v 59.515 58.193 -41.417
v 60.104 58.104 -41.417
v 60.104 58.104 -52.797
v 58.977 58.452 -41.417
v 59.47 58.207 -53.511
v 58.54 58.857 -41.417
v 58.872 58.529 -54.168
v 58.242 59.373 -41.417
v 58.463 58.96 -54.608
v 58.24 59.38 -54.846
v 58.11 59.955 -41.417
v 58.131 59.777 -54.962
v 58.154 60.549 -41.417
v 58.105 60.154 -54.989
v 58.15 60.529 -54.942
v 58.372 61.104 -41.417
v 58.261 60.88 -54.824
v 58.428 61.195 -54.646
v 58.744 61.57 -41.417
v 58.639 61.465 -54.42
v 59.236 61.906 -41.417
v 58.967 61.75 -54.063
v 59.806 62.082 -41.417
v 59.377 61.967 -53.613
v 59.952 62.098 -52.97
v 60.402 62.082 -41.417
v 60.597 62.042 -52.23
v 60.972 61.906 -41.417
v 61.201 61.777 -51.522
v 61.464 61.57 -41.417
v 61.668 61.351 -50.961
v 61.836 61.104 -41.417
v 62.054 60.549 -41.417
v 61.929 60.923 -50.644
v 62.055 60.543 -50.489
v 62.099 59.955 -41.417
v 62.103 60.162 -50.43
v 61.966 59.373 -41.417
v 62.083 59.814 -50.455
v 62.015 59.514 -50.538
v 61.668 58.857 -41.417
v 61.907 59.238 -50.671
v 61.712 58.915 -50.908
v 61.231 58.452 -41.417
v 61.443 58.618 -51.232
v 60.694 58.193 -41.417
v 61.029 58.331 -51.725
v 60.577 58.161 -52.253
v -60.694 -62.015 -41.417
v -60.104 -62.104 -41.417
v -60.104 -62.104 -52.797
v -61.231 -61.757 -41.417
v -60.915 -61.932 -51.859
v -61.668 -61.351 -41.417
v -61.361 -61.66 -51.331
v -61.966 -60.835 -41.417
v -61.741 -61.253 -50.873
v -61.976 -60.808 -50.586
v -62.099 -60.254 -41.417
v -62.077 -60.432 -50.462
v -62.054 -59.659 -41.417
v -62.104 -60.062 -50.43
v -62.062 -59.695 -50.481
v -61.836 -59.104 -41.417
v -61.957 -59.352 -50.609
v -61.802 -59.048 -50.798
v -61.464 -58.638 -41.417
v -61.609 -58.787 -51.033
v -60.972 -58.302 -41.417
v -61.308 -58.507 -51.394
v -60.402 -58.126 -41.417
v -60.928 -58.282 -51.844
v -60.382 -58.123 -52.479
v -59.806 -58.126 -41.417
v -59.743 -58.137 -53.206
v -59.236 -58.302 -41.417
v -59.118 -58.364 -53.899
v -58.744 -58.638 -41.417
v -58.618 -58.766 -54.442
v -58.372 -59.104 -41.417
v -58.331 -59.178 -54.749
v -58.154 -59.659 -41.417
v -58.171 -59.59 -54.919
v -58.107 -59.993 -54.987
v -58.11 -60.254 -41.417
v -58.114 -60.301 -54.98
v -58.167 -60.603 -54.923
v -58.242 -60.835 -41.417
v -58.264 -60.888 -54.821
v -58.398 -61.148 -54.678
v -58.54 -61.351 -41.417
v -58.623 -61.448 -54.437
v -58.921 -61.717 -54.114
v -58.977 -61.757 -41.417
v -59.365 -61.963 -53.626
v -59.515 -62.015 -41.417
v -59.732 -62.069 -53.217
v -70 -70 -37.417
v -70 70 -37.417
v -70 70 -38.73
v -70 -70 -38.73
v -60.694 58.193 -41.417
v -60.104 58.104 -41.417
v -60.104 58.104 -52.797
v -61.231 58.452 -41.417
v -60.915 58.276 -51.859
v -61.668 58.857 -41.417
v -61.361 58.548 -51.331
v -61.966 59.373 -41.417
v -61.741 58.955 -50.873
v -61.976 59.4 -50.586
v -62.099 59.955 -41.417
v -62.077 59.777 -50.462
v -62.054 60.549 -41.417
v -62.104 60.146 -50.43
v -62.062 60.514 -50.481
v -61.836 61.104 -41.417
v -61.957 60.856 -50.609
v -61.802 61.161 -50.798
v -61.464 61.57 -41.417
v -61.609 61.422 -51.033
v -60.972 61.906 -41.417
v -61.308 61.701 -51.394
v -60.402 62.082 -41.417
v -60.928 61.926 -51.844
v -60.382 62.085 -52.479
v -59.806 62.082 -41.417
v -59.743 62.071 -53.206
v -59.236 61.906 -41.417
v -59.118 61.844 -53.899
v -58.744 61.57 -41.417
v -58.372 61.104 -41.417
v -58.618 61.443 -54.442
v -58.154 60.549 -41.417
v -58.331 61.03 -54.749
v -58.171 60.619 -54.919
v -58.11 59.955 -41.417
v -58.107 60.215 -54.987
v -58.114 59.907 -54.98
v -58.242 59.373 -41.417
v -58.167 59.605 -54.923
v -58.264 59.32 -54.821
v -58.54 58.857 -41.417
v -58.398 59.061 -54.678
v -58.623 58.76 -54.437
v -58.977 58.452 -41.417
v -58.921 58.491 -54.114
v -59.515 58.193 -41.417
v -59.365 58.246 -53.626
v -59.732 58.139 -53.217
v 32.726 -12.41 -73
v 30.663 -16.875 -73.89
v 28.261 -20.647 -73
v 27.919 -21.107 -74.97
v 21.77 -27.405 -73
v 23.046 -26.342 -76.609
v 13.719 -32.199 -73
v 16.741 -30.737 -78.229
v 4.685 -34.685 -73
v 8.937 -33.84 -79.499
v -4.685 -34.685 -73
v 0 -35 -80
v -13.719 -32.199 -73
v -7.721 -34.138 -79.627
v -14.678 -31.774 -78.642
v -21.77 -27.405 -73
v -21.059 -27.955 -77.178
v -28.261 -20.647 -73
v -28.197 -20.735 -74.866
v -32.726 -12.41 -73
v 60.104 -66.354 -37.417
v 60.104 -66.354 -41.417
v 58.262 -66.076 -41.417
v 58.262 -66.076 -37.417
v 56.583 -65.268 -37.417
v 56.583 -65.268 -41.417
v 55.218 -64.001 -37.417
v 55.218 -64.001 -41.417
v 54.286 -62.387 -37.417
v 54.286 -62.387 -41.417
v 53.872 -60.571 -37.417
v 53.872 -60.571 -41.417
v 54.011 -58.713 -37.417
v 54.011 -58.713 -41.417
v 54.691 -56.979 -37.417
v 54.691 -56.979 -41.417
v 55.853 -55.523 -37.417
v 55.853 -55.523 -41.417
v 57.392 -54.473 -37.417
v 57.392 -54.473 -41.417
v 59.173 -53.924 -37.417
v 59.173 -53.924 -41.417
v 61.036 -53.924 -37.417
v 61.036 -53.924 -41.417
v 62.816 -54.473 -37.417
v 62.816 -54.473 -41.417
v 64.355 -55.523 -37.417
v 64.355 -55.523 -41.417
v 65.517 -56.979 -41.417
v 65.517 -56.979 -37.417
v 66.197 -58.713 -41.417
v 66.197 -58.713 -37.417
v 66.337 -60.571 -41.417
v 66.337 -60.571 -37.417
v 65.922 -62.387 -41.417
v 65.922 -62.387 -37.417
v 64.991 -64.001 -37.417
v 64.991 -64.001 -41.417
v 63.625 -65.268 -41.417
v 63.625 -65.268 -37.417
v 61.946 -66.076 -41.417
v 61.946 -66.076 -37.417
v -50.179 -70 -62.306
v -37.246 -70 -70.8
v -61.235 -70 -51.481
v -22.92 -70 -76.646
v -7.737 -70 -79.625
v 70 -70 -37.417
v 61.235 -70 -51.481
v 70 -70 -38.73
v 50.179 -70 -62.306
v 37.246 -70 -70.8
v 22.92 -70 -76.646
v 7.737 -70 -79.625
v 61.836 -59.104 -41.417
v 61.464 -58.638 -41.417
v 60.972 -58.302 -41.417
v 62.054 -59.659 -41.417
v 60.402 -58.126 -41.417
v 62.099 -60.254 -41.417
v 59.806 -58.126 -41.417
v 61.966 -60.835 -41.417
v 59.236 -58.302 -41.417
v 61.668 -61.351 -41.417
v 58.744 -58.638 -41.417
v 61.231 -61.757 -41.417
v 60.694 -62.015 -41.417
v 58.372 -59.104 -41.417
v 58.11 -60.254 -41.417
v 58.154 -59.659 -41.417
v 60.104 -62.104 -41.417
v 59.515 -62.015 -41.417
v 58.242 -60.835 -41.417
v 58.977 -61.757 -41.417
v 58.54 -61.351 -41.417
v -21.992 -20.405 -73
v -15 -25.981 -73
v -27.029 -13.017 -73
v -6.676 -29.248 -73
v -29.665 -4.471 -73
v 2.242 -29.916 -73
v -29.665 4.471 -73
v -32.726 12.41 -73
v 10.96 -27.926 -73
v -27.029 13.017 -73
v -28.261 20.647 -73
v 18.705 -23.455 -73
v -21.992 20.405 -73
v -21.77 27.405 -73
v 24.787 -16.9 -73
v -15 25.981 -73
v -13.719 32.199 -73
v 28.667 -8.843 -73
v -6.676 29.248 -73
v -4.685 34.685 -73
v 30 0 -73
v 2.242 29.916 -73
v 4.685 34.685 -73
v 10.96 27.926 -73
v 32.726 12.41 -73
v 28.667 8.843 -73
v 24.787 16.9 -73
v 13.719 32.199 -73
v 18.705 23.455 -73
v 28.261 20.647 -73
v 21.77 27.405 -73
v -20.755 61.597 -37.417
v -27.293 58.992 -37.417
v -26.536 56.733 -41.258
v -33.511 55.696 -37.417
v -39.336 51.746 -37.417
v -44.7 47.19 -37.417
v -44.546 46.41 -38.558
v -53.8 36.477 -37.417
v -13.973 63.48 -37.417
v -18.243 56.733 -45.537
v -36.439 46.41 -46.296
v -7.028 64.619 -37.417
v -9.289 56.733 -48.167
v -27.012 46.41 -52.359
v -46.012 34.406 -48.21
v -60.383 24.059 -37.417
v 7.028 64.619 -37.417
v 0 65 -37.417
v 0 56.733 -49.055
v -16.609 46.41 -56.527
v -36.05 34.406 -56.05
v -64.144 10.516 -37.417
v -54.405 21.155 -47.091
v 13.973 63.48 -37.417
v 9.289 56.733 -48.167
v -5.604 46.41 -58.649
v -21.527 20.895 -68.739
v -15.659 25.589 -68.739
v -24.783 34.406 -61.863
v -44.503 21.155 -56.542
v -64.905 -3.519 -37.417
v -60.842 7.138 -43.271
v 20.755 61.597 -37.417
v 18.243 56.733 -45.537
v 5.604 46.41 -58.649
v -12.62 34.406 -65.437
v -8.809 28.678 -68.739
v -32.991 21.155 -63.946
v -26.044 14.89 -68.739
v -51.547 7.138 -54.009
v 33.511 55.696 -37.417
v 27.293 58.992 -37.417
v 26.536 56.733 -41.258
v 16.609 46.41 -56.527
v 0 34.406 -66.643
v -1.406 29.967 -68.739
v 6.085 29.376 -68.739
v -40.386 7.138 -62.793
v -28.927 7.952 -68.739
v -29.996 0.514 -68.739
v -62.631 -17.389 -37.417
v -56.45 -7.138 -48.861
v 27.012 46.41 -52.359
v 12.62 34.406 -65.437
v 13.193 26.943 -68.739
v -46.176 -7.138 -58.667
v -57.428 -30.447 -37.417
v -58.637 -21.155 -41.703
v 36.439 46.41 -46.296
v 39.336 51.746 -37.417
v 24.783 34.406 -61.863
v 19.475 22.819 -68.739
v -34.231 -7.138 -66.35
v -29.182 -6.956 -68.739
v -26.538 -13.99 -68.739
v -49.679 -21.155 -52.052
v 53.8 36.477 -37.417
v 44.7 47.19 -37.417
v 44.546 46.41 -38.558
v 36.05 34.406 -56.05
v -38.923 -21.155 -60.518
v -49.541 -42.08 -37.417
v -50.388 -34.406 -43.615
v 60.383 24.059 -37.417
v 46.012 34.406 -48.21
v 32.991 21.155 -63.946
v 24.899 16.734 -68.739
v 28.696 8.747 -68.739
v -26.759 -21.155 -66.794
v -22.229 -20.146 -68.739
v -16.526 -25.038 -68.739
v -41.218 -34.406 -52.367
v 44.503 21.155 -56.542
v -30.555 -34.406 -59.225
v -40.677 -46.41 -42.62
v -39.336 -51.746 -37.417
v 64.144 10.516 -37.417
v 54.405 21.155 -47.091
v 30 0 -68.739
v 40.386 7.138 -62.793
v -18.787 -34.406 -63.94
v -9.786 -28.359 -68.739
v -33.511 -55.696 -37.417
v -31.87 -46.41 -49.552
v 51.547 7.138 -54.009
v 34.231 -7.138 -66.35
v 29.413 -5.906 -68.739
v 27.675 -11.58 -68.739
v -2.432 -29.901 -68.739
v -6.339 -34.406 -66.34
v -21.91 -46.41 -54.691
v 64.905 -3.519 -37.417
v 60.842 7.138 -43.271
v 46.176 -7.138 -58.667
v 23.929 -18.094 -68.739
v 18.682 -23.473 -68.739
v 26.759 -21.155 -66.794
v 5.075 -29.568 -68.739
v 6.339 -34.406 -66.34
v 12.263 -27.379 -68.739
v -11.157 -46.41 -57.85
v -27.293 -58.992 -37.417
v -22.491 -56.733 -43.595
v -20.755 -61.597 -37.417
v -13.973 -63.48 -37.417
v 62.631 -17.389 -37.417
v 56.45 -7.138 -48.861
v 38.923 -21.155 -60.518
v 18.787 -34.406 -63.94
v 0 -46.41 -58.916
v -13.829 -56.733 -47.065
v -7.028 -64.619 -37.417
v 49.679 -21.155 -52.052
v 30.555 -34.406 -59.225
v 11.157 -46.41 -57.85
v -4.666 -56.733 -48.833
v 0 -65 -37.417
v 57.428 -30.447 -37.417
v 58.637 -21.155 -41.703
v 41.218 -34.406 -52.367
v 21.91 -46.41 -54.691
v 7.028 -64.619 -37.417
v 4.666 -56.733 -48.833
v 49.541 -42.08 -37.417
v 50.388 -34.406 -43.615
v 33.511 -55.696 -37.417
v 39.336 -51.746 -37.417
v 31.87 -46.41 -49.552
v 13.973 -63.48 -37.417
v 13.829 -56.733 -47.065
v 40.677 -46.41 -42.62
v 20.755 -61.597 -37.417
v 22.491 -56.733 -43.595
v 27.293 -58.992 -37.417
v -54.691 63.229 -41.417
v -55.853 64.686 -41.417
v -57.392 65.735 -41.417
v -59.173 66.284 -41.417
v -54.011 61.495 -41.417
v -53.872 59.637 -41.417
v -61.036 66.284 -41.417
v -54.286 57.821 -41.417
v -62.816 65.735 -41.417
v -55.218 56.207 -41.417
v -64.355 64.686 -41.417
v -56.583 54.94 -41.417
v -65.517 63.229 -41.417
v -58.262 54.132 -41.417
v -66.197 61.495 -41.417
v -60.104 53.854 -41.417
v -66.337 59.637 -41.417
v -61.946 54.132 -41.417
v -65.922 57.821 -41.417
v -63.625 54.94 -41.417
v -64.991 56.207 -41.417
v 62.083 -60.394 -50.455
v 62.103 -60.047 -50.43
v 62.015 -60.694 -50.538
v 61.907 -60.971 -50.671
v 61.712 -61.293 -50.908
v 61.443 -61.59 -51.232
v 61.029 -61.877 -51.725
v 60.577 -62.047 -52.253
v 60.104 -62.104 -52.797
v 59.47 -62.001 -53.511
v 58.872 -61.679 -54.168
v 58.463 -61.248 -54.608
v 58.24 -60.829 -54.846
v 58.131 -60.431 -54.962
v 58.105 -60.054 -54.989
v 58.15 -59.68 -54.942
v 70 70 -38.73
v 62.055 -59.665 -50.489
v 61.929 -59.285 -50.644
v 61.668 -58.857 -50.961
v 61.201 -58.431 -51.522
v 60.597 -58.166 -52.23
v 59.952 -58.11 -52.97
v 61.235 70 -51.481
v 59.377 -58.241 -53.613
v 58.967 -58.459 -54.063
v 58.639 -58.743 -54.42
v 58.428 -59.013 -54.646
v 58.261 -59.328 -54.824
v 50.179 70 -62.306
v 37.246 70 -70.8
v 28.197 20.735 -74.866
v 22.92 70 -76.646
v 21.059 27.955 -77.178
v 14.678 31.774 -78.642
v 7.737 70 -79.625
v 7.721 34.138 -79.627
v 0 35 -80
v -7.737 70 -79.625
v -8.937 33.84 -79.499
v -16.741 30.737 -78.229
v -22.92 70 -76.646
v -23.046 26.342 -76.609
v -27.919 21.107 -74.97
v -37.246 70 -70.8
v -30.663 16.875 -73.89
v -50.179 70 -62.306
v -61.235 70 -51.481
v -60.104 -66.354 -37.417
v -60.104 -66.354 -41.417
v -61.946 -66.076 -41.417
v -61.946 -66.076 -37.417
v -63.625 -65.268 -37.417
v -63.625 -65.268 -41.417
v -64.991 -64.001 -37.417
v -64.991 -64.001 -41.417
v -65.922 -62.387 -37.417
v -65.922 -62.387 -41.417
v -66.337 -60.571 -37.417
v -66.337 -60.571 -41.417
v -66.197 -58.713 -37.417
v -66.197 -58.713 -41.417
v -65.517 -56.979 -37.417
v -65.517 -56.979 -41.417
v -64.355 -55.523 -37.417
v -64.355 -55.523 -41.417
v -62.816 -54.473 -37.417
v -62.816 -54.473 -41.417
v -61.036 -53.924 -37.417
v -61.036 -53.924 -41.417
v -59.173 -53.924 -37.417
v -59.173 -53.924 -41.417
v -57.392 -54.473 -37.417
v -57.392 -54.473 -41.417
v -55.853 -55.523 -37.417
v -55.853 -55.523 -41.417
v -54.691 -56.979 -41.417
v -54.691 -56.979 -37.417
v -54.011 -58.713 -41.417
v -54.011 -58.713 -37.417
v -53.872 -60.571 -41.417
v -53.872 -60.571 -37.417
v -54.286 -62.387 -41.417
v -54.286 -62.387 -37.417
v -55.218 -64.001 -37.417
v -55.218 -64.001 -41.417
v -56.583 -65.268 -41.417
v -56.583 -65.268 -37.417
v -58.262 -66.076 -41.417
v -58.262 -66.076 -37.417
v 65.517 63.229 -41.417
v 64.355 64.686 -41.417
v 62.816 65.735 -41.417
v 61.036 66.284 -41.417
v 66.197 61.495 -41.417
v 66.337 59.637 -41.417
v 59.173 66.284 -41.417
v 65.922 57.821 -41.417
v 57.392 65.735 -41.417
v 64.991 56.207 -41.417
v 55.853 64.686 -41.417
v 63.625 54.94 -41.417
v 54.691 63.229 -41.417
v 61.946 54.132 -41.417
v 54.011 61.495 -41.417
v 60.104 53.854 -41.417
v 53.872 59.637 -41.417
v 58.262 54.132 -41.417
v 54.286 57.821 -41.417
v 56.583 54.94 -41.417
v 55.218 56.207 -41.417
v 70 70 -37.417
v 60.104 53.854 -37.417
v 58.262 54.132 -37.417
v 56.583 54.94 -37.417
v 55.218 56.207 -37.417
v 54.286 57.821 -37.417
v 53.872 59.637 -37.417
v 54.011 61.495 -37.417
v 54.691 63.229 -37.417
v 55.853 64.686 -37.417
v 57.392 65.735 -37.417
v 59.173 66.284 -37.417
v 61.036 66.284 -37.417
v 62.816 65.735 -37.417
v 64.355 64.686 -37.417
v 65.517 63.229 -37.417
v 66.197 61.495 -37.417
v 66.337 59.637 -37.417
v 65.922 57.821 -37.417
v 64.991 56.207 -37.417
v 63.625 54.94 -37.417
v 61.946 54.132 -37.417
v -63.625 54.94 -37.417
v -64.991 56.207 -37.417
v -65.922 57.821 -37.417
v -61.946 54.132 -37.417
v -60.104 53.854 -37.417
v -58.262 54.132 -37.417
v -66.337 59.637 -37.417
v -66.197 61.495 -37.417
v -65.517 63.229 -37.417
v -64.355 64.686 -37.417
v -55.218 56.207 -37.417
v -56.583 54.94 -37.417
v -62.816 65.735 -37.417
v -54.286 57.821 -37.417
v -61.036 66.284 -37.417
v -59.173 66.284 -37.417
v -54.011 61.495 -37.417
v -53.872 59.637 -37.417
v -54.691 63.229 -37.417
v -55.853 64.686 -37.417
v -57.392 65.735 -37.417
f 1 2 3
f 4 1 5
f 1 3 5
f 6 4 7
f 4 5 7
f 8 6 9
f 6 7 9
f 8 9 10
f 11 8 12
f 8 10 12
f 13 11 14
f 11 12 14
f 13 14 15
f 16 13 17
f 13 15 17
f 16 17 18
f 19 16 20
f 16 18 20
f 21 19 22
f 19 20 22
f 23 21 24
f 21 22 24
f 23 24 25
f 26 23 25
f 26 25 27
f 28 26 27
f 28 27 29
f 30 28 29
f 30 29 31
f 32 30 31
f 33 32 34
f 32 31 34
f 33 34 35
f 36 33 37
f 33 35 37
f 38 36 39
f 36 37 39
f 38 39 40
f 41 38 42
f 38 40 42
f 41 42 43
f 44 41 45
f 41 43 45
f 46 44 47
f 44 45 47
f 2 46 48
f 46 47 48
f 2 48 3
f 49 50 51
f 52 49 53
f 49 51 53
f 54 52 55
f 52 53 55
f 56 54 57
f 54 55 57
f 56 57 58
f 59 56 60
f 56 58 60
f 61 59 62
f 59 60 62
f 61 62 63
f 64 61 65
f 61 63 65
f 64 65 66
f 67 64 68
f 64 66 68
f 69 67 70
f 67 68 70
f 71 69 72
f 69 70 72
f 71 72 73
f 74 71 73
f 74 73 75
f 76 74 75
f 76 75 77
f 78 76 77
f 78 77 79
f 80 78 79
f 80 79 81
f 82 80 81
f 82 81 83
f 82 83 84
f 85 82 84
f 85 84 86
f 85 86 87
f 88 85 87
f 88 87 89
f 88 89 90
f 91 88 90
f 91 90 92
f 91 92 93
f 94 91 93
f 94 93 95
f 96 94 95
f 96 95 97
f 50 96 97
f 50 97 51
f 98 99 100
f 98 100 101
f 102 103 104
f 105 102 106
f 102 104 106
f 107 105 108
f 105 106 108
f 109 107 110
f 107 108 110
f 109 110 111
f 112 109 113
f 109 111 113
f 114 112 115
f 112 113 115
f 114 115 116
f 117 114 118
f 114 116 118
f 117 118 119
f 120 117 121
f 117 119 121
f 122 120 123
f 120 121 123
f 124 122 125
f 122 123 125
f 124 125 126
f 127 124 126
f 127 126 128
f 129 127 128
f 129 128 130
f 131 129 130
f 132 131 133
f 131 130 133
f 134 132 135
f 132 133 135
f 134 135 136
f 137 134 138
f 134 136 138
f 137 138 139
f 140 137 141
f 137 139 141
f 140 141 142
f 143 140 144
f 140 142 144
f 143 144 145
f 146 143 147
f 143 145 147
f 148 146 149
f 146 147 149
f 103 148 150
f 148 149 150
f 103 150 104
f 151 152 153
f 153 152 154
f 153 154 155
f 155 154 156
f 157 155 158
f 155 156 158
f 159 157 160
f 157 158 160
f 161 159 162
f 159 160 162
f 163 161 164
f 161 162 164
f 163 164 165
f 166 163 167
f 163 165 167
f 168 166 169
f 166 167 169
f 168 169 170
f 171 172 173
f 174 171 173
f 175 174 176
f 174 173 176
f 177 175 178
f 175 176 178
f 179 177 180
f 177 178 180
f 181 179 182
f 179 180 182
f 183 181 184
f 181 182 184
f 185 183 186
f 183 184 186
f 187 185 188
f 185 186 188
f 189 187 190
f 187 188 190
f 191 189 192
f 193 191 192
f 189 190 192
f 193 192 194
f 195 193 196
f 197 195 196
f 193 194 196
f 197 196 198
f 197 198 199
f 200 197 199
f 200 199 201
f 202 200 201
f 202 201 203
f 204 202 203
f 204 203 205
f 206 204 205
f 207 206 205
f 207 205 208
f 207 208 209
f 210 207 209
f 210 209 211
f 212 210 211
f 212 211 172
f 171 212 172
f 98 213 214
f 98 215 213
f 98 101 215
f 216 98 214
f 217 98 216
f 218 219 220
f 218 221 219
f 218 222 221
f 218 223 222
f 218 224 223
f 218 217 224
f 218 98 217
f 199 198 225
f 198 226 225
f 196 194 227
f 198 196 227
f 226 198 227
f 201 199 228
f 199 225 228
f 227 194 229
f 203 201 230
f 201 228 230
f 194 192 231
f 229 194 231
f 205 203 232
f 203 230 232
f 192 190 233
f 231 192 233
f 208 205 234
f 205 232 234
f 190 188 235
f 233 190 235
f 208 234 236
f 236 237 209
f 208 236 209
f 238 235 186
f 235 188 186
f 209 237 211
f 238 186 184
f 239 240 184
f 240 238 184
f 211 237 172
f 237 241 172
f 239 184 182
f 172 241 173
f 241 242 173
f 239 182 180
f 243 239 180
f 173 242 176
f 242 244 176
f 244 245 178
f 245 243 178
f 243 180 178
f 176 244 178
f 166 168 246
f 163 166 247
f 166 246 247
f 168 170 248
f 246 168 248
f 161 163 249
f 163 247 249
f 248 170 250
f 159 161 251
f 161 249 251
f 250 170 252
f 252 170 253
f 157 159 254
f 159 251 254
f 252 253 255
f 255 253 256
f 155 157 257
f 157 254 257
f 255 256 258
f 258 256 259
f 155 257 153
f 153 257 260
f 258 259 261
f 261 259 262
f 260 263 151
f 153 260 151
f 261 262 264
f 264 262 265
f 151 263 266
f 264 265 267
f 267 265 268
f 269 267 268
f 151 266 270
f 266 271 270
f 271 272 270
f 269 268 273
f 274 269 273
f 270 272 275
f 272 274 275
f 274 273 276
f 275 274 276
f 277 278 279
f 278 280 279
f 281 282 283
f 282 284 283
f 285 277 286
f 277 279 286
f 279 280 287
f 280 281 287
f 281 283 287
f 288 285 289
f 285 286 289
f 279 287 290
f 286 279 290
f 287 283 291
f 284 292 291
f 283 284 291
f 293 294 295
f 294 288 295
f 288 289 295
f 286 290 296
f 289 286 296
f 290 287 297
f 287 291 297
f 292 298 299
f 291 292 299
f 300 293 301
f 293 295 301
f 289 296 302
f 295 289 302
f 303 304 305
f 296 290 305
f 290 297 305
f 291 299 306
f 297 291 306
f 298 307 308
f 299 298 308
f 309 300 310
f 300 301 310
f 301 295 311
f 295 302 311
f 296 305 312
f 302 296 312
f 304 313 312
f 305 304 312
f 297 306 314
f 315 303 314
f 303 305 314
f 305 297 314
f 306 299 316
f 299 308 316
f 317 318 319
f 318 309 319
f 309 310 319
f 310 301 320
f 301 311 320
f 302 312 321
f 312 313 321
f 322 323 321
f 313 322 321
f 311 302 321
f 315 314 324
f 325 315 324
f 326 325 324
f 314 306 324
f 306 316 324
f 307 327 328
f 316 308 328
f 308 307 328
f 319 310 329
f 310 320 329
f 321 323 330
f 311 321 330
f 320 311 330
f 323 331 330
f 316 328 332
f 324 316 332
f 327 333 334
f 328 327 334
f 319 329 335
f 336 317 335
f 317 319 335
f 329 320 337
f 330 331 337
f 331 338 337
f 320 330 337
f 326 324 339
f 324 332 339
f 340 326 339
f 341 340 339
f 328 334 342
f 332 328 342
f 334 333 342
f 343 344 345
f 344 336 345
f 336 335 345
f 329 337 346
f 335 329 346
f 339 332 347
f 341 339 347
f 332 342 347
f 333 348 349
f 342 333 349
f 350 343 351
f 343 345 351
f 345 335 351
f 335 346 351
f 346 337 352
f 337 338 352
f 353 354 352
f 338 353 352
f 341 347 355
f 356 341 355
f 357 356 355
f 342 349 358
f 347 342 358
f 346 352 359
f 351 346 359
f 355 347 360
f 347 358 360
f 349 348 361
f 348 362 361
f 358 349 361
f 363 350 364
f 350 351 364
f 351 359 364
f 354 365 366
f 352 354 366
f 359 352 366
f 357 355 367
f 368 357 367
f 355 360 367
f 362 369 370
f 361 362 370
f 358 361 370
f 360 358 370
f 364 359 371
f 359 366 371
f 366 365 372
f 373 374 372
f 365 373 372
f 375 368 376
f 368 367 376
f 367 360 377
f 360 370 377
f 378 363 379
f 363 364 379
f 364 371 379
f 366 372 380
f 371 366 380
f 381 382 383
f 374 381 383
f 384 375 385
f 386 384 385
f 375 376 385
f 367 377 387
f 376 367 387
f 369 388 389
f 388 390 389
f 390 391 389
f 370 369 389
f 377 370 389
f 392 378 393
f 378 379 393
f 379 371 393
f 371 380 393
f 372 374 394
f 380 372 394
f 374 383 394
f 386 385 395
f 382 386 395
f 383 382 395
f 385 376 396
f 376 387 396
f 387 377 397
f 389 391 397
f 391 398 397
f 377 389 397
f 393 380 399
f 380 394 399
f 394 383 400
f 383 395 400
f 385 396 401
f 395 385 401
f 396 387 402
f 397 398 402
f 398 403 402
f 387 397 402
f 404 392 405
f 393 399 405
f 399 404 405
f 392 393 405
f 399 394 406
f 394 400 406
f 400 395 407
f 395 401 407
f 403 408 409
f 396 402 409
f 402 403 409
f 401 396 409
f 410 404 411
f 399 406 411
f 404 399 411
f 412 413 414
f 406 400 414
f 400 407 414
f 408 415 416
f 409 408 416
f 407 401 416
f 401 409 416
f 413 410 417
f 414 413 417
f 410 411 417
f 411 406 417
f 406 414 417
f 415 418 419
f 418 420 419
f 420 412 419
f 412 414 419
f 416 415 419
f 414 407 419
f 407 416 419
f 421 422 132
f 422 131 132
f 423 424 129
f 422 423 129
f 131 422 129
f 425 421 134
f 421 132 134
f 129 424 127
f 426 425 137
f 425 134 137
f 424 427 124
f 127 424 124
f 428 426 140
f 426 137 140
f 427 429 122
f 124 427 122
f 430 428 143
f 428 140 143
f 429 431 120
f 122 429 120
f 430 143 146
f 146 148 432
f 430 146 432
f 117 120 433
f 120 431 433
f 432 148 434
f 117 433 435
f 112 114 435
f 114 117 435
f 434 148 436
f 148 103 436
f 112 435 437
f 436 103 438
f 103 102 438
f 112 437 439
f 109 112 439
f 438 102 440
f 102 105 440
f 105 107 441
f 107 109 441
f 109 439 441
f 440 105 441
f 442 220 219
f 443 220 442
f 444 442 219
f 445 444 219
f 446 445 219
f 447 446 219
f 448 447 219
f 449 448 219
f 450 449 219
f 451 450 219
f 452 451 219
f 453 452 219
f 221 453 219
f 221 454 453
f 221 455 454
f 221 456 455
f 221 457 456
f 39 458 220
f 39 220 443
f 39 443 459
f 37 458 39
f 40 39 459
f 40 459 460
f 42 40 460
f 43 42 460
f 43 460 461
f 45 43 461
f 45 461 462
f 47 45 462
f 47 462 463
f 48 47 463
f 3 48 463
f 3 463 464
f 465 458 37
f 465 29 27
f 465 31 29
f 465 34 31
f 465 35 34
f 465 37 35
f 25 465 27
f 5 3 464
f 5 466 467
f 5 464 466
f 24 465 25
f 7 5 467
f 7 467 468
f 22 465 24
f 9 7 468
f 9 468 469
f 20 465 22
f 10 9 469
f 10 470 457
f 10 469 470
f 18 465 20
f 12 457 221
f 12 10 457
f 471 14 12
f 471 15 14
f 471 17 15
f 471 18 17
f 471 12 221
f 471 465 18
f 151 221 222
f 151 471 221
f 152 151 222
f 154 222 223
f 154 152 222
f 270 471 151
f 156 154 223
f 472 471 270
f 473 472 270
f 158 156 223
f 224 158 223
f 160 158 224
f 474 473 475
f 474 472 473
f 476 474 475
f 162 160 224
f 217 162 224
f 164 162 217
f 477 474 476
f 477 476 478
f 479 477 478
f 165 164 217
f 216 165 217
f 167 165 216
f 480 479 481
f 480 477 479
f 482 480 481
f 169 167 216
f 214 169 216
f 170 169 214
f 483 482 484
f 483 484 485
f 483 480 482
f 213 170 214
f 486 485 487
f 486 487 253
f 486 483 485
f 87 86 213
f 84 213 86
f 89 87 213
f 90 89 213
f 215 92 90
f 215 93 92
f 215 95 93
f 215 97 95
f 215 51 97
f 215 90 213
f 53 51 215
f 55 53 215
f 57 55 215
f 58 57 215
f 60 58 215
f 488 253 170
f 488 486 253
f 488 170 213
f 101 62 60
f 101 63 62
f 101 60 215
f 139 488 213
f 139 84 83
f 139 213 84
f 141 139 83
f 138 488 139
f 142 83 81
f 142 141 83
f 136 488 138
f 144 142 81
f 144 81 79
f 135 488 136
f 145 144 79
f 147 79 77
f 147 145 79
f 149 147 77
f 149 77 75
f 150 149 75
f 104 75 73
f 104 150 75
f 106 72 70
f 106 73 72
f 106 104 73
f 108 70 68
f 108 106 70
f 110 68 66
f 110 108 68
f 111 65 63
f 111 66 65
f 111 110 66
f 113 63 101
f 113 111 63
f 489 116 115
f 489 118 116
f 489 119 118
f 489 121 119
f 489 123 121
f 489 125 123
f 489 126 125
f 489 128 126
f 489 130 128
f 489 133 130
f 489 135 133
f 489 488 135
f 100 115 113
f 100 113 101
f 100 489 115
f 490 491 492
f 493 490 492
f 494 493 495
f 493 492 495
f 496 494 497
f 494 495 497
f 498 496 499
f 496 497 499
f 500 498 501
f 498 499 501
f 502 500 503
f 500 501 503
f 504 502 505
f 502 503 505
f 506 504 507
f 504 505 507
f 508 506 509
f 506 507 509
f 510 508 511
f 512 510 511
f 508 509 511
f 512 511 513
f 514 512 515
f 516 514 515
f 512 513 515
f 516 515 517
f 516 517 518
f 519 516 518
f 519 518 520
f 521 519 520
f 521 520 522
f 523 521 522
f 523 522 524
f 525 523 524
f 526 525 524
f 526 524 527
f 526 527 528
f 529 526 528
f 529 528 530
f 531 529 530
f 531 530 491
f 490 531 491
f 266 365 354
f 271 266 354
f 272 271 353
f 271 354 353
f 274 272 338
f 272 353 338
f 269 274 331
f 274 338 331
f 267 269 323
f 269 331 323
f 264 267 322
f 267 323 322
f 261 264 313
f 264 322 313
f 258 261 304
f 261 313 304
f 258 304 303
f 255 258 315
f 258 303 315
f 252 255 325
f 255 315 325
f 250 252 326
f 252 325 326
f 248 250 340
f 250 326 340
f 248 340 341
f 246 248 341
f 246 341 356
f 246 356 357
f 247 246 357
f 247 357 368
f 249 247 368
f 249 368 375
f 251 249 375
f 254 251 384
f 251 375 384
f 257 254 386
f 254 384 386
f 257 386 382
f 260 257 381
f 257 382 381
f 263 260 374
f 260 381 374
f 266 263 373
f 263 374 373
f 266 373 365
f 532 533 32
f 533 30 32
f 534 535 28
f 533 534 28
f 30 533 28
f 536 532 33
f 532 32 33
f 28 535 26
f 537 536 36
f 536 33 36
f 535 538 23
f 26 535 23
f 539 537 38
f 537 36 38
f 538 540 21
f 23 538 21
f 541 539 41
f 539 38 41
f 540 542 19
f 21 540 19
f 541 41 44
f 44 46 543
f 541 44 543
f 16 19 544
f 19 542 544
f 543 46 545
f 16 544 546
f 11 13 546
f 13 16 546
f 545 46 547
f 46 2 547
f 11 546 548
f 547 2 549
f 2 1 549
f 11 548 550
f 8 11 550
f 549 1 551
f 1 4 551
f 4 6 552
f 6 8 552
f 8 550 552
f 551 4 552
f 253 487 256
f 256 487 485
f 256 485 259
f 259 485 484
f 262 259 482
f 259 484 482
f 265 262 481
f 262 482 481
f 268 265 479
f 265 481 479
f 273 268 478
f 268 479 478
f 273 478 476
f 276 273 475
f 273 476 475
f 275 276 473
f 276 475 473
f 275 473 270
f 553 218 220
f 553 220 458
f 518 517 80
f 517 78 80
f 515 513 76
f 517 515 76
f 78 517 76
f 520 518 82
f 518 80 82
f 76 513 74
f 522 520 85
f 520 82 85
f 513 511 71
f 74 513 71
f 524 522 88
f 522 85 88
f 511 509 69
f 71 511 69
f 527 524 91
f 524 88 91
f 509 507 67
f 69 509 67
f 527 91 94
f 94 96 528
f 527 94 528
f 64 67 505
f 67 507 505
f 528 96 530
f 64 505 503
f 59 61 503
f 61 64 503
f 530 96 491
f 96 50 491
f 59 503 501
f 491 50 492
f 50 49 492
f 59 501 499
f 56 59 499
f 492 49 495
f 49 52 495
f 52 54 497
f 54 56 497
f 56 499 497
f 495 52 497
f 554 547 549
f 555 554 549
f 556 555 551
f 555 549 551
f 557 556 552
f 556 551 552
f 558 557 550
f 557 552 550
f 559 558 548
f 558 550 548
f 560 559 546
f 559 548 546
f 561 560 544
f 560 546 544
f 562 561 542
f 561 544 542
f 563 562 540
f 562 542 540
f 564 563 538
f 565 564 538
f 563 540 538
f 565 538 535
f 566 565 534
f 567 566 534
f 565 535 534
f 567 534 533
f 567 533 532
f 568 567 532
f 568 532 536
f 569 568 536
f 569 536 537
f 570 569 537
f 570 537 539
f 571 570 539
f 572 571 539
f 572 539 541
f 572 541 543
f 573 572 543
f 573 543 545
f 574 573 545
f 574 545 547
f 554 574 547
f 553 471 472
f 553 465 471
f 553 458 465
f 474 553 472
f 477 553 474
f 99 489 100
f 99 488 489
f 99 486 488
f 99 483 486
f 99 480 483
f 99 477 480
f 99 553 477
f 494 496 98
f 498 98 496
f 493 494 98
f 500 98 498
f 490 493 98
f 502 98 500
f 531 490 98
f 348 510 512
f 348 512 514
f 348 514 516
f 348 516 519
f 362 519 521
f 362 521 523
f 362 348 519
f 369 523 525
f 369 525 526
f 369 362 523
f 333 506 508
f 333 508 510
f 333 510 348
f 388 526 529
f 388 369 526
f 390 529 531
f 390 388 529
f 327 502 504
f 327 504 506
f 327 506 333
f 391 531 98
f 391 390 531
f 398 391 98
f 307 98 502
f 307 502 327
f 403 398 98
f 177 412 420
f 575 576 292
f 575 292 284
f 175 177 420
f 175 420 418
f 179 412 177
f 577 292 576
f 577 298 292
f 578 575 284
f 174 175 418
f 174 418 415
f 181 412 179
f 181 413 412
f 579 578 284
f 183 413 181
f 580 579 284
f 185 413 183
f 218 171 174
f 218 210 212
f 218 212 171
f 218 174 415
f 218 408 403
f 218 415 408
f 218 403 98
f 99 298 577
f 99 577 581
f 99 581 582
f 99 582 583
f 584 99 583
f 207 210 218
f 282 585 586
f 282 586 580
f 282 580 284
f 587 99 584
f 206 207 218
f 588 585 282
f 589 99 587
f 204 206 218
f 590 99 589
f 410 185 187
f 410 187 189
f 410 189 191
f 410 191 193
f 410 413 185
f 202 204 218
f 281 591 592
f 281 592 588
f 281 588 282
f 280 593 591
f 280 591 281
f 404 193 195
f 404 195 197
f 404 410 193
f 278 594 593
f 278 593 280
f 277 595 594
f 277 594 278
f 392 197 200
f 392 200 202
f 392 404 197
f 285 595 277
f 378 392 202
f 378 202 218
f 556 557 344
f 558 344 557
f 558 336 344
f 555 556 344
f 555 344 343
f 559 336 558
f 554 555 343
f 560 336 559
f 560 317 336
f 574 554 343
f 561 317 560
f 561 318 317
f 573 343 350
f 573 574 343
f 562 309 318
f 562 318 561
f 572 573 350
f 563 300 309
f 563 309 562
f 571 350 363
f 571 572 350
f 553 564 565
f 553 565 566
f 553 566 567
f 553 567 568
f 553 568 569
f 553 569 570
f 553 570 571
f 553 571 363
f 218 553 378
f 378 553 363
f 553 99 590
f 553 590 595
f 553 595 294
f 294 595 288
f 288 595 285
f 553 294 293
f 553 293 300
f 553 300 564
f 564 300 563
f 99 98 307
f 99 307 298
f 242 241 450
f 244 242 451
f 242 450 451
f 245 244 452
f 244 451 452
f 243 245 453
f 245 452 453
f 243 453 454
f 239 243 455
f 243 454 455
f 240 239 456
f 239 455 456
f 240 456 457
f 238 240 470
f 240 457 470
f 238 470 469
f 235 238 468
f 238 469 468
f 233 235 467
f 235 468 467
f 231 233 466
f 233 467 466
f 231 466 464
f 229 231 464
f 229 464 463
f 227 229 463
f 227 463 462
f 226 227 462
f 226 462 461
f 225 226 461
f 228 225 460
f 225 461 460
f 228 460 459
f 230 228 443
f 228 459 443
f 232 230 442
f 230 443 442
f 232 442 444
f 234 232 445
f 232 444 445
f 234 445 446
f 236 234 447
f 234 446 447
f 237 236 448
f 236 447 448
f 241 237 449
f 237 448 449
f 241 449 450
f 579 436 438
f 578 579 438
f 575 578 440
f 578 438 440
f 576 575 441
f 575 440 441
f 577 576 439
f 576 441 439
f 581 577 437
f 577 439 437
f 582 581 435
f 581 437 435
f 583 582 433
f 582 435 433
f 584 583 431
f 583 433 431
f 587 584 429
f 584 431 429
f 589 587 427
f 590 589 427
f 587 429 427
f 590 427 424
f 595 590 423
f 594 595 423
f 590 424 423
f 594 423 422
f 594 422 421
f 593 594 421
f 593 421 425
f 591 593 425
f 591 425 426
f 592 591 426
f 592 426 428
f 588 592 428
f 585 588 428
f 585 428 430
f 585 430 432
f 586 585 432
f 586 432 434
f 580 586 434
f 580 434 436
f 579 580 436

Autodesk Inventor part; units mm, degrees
sketch "Sketch1" plane through (0, 0, 0) normal (0, 0, 1) x (1, 0, 0)
  line L0 (65, -65) -> (-65, -65)
  line L1 (-65, -65) -> (-65, 65)
  line L2 (-65, 65) -> (65, 65)
  line L3 (65, 65) -> (65, -65)
  line L4 (65, -65) -> (-65, 65) construction
  line L5 (-65, -65) -> (65, 65) construction
  point P0 (0, 0)
  dimension "d0" = 130
  dimension "d1" = 130
extrude "Extrusion1" add sketch "Sketch1" against normal blind 100
sketch "Sketch2" plane through (0, 0, 0) normal (0, 0, 1) x (1, 0, 0)
  arc A0 (0, 75) -> (0, -75) centre (0, 0) ccw
  line L0 (0, 0) -> (0, 75) construction
  line L1 (0, 0) -> (75, 0) construction
  line L2 (0, 0) -> (0, -75) construction
  line L3 (0, 75) -> (0, -75)
  dimension "d4" = 75
  dimension "d5" = 90
  dimension "d6" = 180
revolve "Revolution1" cut sketch "Sketch2" angle 180 about axis through (0, 75, 0) along (0, -1, 0)
ref_plane "Work Plane1" through (0, 65, -37.4166) normal (0, 0, 1) x (1, 0, 0)
sketch "Sketch3" plane through (0, 65, -37.4166) normal (0, 0, 1) x (1, 0, 0)
  line L0 (-65, -130) -> (65, -130)
  line L1 (65, -130) -> (65, 0)
  line L2 (65, 0) -> (-65, 0)
  line L3 (-65, 0) -> (-65, -130)
  line L4 (-65, -130) -> (65, 0) construction
  line L5 (65, -130) -> (-65, 0) construction
  point P0 (0, -65)
  dimension "d8" = 130
  dimension "d9" = 130
extrude "Extrusion2" cut sketch "Sketch3" along normal blind 100
sketch "Sketch4" plane through (0, 65, -37.4166) normal (0, 0, 1) x (1, 0, 0)
  line L0 (-65, -130) -> (65, -130)
  line L1 (65, -130) -> (65, 0)
  line L2 (65, 0) -> (-65, 0)
  line L3 (-65, 0) -> (-65, -130)
  line L4 (-65, -130) -> (65, 0) construction
  line L5 (65, -130) -> (-65, 0) construction
  line L6 (-70, -135) -> (70, -135)
  line L7 (70, -135) -> (70, 5)
  line L8 (70, 5) -> (-70, 5)
  line L9 (-70, 5) -> (-70, -135)
  arc A0 (65, -65) -> (0, 0) centre (0, -65) ccw projected
  line L10 (-70, -135) -> (70, 5) construction
  line L11 (70, -135) -> (-70, 5) construction
  dimension "d12" = 130
  dimension "d13" = 130
  dimension "d14" = 140
  dimension "d15" = 140
extrude "Extrusion3" add sketch "Sketch4" against normal blind 50
sketch "Sketch5" plane through (-65, 65, -100) normal (0, 1, 0) x (1, 0, 0)
  line L0 (0, 0) -> (130, 0)
  line L1 (130, 0) -> (130, -12.5834)
  line L2 (130, -12.5834) -> (0, -12.5834)
  line L3 (0, -12.5834) -> (0, 0)
  point P0 (65, -100)
extrude "Extrusion4" cut sketch "Sketch5" against normal blind 130
ref_plane "Work Plane2" through (0, 0, -75) normal (0, 0, 1) x (1, 0, 0)
sketch "Sketch6" plane through (0, 0, -75) normal (0, 0, 1) x (1, 0, 0)
  circle A0 centre (0, 0) radius 30
  dimension "d20" = 60
extrude "Extrusion5" cut sketch "Sketch6" against normal blind 30 and the other way blind 30
sketch "Sketch7" plane through (0, 0, 0) normal (0, 1, 0) x (-1, 0, 0)
  circle A0 centre (0, 0) radius 80
  circle A1 centre (0, 0) radius 150
  dimension "d25" = 160
  dimension "d26" = 300
extrude "Extrusion6" cut sketch "Sketch7" against normal blind 100 and the other way blind 100
sketch "Sketch8" plane through (0, 0, 0) normal (1, 0, 0) x (0, 1, 0)
  point P0 (0, 0)
ref_plane "Work Plane3" through (65, 0, -37.4166) normal (1, 0, 0) x (0, 1, 0)
sketch "Sketch10" plane through (0, 65, -37.4166) normal (0, 0, 1) x (1, 0, 0)
  circle A0 centre (-60.1041, -4.8959) radius 2
  point P0 (0, -65)
  dimension "d36" = 4
  dimension "d37" = 85
  dimension "d38" = 60.1041
sketch "Sketch11" plane through (0, 65, -37.4166) normal (0, 0, 1) x (1, 0, 0)
  circle A0 centre (60.1041, -4.8959) radius 2
  point P0 (0, -65)
  dimension "d39" = 4
  dimension "d40" = 85
  dimension "d41" = 60.1041
sketch "Sketch12" plane through (0, 65, -37.4166) normal (0, 0, 1) x (1, 0, 0)
  circle A0 centre (-60.1041, -125.1041) radius 2
  point P0 (0, -65)
  dimension "d42" = 4
  dimension "d43" = 85
  dimension "d44" = 60.1041
sketch "Sketch13" plane through (0, 65, -37.4166) normal (0, 0, 1) x (1, 0, 0)
  circle A0 centre (60.1041, -125.1041) radius 2
  point P0 (0, -65)
  dimension "d45" = 4
  dimension "d46" = 85
  dimension "d47" = 60.1041
hole "Hole1" at (-60.1041, 60.1041, -37.4166) direction (0, 0, -1) diameter 4 end through all counterbore diameter 12.5 counterbore depth 4
hole "Hole2" at (60.1041, 60.1041, -37.4166) direction (0, 0, -1) diameter 4 end through all counterbore diameter 12.5 counterbore depth 4
hole "Hole3" at (-60.1041, -60.1041, -37.4166) direction (0, 0, -1) diameter 4 end through all counterbore diameter 12.5 counterbore depth 4
hole "Hole4" at (60.1041, -60.1041, -37.4166) direction (0, 0, -1) diameter 4 end through all counterbore diameter 12.5 counterbore depth 4
thread "Thread1" size "M4x0.7" class "6H" standard "ANSI Metric M Profile" full length
thread "Thread2" size "M4x0.7" class "6H" standard "ANSI Metric M Profile" full length
thread "Thread3" size "M4x0.7" class "6H" standard "ANSI Metric M Profile" full length
thread "Thread4" size "M4x0.7" class "6H" standard "ANSI Metric M Profile" full length
ref_plane "Work Plane4" through (-70, 30, -37.4166) normal (0, 1, 0) x (1, 0, 0)
ref_plane "Work Plane5" through (0, 0, -65) normal (0, 0, 1) x (1, 0, 0)
sketch "Sketch16" plane through (0, 0, 0) normal (0, 1, 0) x (-1, 0, 0)
  circle A0 centre (0, 0) radius 80
  circle A1 centre (0, 0) radius 150
  dimension "d96" = 160
  dimension "d97" = 300
extrude "Extrusion10" cut sketch "Sketch16" along normal blind 100 and the other way blind 100
ref_plane "Work Plane6" through (-70, -30, -37.4166) normal (0, 1, 0) x (1, 0, 0)
ref_plane "Work Plane7" through (0, 0, -80) normal (0, 0, 1) x (1, 0, 0)
sketch "Sketch22" plane through (0, 0, -80) normal (0, 0, 1) x (1, 0, 0)
  circle A0 centre (0, 0) radius 35
  dimension "d131" = 70
extrude "Extrusion15" cut sketch "Sketch22" along normal blind 7
equation "\"d0\" = d1"
equation "\"d9\" = d8"
properties part number "Custom Mirror Design Part 2"
